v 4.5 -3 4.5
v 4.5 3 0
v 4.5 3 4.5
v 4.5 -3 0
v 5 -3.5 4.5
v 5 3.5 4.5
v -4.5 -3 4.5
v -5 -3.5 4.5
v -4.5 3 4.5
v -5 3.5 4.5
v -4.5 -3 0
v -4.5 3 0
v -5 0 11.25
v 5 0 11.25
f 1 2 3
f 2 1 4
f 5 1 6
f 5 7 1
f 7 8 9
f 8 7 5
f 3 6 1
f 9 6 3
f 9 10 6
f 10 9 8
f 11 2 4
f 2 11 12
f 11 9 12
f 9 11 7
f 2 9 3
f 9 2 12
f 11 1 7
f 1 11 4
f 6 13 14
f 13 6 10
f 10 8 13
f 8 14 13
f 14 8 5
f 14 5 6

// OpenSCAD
// Bar — compact lodge-style building, roughly half-size of the main lodge.
// Rectangular plan with a steep gable roof so snow sheds off rather than
// piling up. Designed for casual gathering: a warm spot near the lifts
// without the scale of the full lodge.
//
// Conventions, units, and axis docs: see models-src/README.md.
//
//     +X = primary horizontal direction (front façade faces +X)
//     +Y = lateral / perpendicular horizontal
//     +Z = up in SCAD (rotates to game Y-up at export)
//   Origin sits at ground plane, centred on the footprint.

$fn = 16;

// ── Dimensions (metres) ────────────────────────────────────────────────
// Roughly half-size of the lodge for a secondary/annex scale:
//   Lodge: 18 m × 12 m → Bar: 9.0 m × 6.0 m
bar_w = 9.0;    // long side, +X primary direction (front faces +X)
bar_d = 6.0;    // short side, +Y perpendicular
bar_h = 4.5;    // wall height before the gable starts

// Steep ~48° pitch so snow sheds cleanly.
roof_rise = 6.75;      // ridge height above wall top
overhang = 0.5;        // eaves overhang on every side

// ── Geometry ───────────────────────────────────────────────────────────
// Walls: rectangular box centred on the origin, sitting on Z = 0.
module walls() {
    color("Tan")
        translate([0, 0, bar_h / 2])
            cube([bar_w, bar_d, bar_h], center = true);
}

// Roof: triangular prism running along the long axis (X). linear_extrude
// with scale = [1, 0] tapers Y to zero at the ridge while keeping X
// full-length. The base is slightly larger than the walls so the eaves
// overhang all sides.
module roof() {
    color("DarkSlateGray")
        translate([0, 0, bar_h])
            linear_extrude(height = roof_rise, scale = [1, 0])
                square([bar_w + 2*overhang, bar_d + 2*overhang], center = true);
}

module bar() {
    walls();
    roof();
}

bar();

// ── Footprint metadata ─────────────────────────────────────────────────
// Half-extents in SCAD coords (X, Y) — the eaves overhang adds 0.5 m
// per side so the apron + tree-clearance zone covers the full visible
// silhouette including the roof edge. The scad2obj converter applies the
// SCAD → game rotation and writes the canonical (halfX, halfZ) into the
// OBJ header for the placement pass.
echo("MOGUL_META", "footprint", bar_w / 2 + overhang, bar_d / 2 + overhang);
